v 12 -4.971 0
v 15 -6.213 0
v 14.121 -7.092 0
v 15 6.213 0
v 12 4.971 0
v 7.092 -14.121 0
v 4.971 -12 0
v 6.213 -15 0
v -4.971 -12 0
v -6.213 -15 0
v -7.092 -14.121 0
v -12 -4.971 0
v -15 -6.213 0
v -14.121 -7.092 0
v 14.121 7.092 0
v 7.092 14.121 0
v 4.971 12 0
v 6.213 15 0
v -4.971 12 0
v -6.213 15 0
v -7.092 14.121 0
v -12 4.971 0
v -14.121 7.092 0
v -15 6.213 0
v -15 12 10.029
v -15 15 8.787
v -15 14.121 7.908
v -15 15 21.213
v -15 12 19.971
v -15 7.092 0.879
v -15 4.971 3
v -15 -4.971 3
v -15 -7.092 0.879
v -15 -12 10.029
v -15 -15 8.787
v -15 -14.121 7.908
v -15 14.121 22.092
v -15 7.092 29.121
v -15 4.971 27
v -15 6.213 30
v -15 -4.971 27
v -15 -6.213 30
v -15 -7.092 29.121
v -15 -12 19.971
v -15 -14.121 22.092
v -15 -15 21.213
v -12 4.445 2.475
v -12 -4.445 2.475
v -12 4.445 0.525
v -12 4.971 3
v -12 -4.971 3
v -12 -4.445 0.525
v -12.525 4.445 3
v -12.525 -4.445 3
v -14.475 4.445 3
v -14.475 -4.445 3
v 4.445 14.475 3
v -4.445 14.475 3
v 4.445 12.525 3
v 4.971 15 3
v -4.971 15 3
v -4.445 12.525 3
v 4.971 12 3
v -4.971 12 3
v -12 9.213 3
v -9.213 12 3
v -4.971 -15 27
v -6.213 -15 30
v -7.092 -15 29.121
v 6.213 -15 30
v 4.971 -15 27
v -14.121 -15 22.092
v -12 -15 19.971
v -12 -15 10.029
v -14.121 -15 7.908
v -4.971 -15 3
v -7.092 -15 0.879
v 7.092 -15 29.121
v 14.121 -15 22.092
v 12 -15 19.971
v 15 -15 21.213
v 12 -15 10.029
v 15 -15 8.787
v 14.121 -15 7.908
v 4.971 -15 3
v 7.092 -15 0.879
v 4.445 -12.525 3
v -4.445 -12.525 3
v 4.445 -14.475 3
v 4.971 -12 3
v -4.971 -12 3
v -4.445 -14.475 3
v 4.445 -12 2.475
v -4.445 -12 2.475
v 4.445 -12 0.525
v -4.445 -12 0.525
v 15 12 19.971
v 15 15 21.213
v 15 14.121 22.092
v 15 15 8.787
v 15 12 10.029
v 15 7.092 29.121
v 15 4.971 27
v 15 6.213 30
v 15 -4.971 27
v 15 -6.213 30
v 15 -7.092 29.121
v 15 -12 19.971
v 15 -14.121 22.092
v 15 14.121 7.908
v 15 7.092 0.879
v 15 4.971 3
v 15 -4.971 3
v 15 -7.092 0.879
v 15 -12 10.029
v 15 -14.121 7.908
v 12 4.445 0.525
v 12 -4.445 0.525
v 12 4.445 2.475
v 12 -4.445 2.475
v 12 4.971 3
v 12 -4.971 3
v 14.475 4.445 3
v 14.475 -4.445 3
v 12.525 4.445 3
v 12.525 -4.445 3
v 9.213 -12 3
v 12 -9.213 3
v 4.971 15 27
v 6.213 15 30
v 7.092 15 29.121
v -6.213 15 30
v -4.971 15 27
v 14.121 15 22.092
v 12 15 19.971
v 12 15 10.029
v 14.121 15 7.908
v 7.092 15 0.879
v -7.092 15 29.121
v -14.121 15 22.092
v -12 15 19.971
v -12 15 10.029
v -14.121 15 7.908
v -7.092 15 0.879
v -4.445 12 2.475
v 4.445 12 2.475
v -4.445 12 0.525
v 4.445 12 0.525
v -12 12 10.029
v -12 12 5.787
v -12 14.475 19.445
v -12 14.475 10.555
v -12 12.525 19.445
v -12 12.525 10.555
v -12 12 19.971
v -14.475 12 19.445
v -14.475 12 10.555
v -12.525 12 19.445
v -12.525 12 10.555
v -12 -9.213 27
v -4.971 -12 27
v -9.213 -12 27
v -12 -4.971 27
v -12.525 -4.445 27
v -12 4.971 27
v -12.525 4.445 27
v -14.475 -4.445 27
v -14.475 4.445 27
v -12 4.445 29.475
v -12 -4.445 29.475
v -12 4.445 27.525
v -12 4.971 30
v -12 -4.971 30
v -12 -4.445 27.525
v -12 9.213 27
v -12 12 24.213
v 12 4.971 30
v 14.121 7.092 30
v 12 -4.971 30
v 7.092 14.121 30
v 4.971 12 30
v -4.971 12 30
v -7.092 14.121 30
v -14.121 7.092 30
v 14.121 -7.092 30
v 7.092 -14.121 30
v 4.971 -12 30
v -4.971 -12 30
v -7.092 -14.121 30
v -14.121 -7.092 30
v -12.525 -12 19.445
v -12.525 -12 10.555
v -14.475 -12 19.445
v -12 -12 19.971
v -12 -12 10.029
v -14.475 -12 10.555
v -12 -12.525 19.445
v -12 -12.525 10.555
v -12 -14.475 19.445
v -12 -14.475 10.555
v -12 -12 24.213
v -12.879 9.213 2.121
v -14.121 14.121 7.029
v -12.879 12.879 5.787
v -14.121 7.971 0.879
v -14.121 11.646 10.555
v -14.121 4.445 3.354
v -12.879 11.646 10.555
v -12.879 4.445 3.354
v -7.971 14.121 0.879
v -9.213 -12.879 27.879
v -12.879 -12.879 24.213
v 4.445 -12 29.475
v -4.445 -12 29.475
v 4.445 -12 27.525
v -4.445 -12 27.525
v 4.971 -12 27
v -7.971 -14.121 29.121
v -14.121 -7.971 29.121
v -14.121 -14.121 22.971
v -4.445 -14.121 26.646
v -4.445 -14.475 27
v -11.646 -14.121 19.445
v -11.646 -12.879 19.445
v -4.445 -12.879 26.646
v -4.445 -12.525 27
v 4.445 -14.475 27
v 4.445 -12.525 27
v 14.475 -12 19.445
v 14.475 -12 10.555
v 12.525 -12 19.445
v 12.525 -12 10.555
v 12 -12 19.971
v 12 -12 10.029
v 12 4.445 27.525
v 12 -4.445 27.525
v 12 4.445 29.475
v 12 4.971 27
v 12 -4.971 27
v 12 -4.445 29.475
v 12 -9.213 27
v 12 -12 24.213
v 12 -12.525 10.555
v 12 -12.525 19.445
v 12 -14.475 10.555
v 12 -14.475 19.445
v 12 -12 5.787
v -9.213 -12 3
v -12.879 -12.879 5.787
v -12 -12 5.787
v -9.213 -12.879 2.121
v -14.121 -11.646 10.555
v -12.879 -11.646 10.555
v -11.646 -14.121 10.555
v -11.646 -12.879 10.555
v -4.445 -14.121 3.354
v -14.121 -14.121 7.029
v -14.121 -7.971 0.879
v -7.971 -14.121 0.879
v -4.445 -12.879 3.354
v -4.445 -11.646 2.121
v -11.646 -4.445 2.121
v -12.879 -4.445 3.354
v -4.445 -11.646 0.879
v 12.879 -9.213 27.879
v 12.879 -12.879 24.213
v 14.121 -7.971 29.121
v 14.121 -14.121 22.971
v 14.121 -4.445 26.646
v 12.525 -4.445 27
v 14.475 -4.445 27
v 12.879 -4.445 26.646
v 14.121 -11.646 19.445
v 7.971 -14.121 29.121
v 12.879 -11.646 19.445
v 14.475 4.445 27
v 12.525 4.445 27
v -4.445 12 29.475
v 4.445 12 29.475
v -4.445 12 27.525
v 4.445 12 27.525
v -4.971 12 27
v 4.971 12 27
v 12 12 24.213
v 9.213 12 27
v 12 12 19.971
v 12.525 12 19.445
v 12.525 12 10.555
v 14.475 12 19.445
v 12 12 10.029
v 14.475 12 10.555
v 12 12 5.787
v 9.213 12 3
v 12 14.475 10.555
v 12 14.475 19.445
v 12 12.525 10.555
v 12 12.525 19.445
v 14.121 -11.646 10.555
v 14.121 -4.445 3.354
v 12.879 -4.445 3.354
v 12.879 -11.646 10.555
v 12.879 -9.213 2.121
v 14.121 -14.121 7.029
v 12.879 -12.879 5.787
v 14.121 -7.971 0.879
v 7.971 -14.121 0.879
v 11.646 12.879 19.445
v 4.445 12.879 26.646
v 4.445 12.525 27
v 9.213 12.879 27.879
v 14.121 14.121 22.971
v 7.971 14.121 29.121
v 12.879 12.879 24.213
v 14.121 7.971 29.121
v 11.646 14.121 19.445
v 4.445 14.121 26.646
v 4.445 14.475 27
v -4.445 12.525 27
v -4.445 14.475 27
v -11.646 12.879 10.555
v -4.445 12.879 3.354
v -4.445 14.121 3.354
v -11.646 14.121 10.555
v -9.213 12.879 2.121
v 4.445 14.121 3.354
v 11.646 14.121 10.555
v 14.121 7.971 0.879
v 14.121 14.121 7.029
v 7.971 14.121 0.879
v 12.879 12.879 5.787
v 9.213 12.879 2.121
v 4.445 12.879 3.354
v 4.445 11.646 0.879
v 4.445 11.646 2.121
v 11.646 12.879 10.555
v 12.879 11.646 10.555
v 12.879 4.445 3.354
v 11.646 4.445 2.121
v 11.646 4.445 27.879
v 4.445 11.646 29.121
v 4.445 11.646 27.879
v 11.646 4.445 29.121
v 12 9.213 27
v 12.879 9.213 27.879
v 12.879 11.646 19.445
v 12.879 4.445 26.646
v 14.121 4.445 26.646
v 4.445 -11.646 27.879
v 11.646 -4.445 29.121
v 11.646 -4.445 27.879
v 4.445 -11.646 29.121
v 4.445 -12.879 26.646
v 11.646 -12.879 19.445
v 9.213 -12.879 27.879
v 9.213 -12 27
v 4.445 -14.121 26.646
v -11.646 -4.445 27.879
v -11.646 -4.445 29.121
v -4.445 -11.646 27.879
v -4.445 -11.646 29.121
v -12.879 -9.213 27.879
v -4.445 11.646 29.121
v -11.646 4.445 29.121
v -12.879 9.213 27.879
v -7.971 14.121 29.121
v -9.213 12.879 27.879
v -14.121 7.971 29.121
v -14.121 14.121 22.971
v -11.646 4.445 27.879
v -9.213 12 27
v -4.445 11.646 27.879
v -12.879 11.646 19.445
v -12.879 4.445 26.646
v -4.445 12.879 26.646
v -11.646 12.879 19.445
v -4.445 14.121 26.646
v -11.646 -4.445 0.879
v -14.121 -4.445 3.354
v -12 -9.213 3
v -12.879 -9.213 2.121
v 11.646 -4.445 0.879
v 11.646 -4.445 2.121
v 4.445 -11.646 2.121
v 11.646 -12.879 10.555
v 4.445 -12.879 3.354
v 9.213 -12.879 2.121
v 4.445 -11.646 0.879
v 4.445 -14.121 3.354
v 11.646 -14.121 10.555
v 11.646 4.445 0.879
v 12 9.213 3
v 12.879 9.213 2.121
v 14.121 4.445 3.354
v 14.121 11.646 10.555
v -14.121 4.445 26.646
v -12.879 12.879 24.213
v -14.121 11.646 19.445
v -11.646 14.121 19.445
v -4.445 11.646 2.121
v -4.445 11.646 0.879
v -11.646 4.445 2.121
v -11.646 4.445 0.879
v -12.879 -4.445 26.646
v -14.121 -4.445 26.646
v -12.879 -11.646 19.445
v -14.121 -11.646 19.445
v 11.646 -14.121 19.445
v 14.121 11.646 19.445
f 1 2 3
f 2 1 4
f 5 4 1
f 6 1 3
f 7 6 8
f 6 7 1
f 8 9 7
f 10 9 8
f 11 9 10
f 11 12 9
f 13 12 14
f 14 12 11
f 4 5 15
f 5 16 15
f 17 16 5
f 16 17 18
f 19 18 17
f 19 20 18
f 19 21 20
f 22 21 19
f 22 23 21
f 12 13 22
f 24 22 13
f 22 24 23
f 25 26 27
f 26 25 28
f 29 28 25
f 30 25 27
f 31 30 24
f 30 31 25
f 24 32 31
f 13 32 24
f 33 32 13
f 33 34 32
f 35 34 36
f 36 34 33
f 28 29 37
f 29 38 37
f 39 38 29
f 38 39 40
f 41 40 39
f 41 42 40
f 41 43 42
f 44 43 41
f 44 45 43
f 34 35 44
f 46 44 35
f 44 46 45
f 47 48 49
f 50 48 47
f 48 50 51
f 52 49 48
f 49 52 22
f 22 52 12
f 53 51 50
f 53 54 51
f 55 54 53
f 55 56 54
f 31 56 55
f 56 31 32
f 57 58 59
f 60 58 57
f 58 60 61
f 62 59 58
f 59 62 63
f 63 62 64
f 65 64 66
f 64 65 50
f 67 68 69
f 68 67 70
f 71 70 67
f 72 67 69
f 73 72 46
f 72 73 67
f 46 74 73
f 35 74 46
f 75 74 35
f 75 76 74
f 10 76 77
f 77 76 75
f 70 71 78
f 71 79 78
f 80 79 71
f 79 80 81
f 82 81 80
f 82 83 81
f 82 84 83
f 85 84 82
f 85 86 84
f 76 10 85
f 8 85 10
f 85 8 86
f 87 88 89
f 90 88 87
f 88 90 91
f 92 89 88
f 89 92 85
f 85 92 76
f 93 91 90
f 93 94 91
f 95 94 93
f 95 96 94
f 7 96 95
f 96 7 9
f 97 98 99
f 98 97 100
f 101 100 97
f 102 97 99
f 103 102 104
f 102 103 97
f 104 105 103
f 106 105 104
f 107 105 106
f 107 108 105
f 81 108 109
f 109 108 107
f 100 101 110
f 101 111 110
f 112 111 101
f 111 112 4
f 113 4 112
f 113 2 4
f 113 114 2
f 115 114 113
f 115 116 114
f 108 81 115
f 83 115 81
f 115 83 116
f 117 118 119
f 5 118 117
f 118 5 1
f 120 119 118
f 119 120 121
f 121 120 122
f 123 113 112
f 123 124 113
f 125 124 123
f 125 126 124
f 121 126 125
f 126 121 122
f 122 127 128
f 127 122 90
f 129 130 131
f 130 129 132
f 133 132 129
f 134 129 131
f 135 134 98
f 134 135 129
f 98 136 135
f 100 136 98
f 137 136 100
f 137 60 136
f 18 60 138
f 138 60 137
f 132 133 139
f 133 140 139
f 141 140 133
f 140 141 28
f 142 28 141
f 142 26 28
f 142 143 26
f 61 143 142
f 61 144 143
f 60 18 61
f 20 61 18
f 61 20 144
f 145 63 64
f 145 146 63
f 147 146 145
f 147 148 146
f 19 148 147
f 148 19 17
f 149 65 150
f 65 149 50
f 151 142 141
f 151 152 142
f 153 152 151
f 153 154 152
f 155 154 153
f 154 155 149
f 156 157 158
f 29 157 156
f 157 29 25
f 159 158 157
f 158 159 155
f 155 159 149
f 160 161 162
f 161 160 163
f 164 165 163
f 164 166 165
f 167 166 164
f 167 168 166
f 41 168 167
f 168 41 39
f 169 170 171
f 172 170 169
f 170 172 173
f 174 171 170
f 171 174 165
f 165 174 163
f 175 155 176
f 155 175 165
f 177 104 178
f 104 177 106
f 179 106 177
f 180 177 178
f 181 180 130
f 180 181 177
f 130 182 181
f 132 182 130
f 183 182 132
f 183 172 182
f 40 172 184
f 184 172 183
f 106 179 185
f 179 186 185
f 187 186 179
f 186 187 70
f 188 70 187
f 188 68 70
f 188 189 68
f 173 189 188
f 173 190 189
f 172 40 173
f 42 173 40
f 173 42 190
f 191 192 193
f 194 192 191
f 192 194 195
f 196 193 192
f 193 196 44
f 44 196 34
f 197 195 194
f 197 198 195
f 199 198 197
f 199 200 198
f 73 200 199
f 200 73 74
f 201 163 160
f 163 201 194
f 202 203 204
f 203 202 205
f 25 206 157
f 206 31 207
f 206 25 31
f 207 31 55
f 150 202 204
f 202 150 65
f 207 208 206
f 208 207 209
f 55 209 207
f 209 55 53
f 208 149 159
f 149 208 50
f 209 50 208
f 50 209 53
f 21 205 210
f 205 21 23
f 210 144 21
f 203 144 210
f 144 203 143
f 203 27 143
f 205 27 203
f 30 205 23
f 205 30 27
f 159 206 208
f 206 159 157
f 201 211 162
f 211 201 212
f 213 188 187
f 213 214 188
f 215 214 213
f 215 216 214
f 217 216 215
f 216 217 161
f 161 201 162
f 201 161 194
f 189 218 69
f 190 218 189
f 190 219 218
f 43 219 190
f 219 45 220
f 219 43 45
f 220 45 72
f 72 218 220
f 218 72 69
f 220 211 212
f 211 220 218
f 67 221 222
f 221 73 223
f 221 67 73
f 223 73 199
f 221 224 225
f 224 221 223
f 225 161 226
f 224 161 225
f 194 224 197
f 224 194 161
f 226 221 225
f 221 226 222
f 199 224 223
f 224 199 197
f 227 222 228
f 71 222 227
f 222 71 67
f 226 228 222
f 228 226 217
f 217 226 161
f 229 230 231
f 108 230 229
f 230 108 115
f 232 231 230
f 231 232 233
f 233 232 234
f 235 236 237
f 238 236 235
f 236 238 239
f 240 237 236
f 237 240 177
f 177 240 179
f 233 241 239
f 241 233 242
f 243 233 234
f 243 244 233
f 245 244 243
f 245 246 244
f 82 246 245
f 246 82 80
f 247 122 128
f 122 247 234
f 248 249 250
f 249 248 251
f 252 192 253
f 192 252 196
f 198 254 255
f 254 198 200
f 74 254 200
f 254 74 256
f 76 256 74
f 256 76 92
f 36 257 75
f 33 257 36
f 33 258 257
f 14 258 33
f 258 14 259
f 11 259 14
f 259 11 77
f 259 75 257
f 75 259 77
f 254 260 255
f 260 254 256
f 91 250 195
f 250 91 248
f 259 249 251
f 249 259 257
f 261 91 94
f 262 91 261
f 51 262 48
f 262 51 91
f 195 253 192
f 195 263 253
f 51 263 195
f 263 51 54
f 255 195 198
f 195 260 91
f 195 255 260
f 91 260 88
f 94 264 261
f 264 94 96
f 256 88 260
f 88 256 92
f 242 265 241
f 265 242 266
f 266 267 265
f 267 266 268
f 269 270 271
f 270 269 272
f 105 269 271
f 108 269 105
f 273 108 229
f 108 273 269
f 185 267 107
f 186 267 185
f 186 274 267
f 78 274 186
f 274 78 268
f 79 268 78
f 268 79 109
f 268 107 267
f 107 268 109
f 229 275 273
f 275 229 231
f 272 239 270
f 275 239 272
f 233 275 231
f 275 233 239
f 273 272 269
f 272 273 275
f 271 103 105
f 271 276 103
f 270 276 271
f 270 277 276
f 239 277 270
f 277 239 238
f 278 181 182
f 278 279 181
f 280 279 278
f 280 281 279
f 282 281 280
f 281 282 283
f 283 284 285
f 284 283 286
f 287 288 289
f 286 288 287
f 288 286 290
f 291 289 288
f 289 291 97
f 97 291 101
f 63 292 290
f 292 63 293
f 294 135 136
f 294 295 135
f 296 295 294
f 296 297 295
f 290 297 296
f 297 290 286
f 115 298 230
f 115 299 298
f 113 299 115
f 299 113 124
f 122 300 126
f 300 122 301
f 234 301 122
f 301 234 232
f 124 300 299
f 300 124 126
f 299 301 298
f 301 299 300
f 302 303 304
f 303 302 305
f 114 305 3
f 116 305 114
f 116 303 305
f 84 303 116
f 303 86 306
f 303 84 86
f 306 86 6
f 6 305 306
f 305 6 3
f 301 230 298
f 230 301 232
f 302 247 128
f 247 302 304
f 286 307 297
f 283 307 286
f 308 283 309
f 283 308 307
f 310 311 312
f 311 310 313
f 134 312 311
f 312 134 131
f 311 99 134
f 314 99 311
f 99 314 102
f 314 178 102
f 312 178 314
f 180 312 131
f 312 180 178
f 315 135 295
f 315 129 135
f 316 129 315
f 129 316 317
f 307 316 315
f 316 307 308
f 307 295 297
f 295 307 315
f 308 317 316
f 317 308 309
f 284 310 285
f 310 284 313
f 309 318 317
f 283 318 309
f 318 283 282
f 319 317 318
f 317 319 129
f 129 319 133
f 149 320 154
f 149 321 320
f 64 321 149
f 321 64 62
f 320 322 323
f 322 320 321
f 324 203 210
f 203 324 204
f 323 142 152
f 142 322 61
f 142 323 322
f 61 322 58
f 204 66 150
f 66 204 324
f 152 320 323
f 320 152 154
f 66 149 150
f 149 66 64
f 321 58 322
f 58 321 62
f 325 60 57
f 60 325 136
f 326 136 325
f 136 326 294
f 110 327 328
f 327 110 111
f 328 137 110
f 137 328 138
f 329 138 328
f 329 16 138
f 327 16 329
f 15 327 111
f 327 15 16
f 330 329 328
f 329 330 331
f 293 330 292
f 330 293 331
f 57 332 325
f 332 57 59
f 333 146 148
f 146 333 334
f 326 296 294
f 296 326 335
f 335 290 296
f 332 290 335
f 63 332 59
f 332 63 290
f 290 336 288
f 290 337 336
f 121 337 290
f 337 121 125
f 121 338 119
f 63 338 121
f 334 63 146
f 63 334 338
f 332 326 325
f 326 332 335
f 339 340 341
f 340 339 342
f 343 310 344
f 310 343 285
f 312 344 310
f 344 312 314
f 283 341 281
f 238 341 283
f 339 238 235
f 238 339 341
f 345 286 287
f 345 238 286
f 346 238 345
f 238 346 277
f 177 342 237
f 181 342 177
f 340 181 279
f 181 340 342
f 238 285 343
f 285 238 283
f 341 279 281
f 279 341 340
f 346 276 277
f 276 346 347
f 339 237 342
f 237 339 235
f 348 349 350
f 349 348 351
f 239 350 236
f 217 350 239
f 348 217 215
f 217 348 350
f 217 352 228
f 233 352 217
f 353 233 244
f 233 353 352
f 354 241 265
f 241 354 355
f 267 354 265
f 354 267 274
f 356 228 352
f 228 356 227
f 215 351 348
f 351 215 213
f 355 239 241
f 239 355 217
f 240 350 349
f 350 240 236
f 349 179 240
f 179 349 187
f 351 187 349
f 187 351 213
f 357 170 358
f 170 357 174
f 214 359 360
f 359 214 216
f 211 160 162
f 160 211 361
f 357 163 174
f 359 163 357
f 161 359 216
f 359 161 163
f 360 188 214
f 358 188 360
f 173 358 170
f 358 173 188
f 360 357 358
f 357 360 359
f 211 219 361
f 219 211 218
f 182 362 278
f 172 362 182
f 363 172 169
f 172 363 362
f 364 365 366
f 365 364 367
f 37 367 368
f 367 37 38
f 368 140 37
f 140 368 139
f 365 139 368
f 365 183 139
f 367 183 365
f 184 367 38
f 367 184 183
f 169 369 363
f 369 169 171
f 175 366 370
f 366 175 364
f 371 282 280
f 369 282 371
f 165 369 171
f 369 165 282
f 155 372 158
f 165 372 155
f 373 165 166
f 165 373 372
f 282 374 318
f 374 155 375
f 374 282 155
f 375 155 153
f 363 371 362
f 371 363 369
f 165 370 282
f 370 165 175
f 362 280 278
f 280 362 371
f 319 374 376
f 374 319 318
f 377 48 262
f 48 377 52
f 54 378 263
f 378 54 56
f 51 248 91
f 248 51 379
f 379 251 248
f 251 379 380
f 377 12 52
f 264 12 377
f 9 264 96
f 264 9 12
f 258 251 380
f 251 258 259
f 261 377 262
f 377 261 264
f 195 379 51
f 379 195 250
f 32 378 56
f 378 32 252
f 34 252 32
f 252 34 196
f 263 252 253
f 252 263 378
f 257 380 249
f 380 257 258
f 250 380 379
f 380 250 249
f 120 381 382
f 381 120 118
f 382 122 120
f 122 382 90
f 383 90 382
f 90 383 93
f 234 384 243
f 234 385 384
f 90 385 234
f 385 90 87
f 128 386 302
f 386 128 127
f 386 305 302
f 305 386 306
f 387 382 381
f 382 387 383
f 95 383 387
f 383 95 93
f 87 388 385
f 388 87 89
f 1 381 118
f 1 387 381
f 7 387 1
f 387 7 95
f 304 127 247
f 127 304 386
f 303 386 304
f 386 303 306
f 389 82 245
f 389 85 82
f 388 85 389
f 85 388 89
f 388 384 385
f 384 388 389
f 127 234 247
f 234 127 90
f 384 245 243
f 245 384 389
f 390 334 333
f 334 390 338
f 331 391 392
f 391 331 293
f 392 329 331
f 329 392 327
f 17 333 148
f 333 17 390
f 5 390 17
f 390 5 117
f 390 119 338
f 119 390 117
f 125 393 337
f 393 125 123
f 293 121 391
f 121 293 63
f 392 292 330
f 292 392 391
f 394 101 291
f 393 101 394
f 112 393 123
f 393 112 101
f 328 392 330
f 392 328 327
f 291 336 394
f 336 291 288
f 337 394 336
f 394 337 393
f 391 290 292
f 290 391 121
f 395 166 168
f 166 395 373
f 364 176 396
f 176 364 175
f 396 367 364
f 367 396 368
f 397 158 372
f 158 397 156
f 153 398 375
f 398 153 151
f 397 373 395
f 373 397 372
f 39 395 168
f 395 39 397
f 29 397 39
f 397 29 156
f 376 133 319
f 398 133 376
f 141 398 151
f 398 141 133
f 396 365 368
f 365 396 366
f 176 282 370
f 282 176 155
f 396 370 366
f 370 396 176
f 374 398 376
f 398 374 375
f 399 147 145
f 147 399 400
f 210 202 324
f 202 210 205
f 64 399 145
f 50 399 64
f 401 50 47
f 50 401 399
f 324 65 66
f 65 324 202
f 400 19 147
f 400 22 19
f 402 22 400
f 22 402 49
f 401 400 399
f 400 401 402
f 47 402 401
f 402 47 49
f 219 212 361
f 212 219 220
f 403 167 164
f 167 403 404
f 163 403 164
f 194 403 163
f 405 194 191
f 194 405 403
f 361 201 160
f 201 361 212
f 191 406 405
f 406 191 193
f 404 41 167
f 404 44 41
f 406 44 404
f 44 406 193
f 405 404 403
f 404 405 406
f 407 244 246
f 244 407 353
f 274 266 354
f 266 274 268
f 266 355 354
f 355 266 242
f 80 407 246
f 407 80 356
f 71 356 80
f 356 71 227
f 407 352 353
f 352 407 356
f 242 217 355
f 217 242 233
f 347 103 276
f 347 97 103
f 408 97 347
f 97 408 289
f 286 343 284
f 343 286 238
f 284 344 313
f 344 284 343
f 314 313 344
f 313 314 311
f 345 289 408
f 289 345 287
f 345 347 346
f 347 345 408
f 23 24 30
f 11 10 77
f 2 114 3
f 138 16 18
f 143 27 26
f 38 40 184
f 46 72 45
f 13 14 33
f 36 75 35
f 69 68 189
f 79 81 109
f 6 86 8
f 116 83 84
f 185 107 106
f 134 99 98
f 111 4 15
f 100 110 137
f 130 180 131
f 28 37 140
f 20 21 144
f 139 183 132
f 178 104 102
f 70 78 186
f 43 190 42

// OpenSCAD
// shape height
sh = 30;
// border width
bw = 3;

include <polyhedra.scad>;

poly_wire(truncated_cube);
